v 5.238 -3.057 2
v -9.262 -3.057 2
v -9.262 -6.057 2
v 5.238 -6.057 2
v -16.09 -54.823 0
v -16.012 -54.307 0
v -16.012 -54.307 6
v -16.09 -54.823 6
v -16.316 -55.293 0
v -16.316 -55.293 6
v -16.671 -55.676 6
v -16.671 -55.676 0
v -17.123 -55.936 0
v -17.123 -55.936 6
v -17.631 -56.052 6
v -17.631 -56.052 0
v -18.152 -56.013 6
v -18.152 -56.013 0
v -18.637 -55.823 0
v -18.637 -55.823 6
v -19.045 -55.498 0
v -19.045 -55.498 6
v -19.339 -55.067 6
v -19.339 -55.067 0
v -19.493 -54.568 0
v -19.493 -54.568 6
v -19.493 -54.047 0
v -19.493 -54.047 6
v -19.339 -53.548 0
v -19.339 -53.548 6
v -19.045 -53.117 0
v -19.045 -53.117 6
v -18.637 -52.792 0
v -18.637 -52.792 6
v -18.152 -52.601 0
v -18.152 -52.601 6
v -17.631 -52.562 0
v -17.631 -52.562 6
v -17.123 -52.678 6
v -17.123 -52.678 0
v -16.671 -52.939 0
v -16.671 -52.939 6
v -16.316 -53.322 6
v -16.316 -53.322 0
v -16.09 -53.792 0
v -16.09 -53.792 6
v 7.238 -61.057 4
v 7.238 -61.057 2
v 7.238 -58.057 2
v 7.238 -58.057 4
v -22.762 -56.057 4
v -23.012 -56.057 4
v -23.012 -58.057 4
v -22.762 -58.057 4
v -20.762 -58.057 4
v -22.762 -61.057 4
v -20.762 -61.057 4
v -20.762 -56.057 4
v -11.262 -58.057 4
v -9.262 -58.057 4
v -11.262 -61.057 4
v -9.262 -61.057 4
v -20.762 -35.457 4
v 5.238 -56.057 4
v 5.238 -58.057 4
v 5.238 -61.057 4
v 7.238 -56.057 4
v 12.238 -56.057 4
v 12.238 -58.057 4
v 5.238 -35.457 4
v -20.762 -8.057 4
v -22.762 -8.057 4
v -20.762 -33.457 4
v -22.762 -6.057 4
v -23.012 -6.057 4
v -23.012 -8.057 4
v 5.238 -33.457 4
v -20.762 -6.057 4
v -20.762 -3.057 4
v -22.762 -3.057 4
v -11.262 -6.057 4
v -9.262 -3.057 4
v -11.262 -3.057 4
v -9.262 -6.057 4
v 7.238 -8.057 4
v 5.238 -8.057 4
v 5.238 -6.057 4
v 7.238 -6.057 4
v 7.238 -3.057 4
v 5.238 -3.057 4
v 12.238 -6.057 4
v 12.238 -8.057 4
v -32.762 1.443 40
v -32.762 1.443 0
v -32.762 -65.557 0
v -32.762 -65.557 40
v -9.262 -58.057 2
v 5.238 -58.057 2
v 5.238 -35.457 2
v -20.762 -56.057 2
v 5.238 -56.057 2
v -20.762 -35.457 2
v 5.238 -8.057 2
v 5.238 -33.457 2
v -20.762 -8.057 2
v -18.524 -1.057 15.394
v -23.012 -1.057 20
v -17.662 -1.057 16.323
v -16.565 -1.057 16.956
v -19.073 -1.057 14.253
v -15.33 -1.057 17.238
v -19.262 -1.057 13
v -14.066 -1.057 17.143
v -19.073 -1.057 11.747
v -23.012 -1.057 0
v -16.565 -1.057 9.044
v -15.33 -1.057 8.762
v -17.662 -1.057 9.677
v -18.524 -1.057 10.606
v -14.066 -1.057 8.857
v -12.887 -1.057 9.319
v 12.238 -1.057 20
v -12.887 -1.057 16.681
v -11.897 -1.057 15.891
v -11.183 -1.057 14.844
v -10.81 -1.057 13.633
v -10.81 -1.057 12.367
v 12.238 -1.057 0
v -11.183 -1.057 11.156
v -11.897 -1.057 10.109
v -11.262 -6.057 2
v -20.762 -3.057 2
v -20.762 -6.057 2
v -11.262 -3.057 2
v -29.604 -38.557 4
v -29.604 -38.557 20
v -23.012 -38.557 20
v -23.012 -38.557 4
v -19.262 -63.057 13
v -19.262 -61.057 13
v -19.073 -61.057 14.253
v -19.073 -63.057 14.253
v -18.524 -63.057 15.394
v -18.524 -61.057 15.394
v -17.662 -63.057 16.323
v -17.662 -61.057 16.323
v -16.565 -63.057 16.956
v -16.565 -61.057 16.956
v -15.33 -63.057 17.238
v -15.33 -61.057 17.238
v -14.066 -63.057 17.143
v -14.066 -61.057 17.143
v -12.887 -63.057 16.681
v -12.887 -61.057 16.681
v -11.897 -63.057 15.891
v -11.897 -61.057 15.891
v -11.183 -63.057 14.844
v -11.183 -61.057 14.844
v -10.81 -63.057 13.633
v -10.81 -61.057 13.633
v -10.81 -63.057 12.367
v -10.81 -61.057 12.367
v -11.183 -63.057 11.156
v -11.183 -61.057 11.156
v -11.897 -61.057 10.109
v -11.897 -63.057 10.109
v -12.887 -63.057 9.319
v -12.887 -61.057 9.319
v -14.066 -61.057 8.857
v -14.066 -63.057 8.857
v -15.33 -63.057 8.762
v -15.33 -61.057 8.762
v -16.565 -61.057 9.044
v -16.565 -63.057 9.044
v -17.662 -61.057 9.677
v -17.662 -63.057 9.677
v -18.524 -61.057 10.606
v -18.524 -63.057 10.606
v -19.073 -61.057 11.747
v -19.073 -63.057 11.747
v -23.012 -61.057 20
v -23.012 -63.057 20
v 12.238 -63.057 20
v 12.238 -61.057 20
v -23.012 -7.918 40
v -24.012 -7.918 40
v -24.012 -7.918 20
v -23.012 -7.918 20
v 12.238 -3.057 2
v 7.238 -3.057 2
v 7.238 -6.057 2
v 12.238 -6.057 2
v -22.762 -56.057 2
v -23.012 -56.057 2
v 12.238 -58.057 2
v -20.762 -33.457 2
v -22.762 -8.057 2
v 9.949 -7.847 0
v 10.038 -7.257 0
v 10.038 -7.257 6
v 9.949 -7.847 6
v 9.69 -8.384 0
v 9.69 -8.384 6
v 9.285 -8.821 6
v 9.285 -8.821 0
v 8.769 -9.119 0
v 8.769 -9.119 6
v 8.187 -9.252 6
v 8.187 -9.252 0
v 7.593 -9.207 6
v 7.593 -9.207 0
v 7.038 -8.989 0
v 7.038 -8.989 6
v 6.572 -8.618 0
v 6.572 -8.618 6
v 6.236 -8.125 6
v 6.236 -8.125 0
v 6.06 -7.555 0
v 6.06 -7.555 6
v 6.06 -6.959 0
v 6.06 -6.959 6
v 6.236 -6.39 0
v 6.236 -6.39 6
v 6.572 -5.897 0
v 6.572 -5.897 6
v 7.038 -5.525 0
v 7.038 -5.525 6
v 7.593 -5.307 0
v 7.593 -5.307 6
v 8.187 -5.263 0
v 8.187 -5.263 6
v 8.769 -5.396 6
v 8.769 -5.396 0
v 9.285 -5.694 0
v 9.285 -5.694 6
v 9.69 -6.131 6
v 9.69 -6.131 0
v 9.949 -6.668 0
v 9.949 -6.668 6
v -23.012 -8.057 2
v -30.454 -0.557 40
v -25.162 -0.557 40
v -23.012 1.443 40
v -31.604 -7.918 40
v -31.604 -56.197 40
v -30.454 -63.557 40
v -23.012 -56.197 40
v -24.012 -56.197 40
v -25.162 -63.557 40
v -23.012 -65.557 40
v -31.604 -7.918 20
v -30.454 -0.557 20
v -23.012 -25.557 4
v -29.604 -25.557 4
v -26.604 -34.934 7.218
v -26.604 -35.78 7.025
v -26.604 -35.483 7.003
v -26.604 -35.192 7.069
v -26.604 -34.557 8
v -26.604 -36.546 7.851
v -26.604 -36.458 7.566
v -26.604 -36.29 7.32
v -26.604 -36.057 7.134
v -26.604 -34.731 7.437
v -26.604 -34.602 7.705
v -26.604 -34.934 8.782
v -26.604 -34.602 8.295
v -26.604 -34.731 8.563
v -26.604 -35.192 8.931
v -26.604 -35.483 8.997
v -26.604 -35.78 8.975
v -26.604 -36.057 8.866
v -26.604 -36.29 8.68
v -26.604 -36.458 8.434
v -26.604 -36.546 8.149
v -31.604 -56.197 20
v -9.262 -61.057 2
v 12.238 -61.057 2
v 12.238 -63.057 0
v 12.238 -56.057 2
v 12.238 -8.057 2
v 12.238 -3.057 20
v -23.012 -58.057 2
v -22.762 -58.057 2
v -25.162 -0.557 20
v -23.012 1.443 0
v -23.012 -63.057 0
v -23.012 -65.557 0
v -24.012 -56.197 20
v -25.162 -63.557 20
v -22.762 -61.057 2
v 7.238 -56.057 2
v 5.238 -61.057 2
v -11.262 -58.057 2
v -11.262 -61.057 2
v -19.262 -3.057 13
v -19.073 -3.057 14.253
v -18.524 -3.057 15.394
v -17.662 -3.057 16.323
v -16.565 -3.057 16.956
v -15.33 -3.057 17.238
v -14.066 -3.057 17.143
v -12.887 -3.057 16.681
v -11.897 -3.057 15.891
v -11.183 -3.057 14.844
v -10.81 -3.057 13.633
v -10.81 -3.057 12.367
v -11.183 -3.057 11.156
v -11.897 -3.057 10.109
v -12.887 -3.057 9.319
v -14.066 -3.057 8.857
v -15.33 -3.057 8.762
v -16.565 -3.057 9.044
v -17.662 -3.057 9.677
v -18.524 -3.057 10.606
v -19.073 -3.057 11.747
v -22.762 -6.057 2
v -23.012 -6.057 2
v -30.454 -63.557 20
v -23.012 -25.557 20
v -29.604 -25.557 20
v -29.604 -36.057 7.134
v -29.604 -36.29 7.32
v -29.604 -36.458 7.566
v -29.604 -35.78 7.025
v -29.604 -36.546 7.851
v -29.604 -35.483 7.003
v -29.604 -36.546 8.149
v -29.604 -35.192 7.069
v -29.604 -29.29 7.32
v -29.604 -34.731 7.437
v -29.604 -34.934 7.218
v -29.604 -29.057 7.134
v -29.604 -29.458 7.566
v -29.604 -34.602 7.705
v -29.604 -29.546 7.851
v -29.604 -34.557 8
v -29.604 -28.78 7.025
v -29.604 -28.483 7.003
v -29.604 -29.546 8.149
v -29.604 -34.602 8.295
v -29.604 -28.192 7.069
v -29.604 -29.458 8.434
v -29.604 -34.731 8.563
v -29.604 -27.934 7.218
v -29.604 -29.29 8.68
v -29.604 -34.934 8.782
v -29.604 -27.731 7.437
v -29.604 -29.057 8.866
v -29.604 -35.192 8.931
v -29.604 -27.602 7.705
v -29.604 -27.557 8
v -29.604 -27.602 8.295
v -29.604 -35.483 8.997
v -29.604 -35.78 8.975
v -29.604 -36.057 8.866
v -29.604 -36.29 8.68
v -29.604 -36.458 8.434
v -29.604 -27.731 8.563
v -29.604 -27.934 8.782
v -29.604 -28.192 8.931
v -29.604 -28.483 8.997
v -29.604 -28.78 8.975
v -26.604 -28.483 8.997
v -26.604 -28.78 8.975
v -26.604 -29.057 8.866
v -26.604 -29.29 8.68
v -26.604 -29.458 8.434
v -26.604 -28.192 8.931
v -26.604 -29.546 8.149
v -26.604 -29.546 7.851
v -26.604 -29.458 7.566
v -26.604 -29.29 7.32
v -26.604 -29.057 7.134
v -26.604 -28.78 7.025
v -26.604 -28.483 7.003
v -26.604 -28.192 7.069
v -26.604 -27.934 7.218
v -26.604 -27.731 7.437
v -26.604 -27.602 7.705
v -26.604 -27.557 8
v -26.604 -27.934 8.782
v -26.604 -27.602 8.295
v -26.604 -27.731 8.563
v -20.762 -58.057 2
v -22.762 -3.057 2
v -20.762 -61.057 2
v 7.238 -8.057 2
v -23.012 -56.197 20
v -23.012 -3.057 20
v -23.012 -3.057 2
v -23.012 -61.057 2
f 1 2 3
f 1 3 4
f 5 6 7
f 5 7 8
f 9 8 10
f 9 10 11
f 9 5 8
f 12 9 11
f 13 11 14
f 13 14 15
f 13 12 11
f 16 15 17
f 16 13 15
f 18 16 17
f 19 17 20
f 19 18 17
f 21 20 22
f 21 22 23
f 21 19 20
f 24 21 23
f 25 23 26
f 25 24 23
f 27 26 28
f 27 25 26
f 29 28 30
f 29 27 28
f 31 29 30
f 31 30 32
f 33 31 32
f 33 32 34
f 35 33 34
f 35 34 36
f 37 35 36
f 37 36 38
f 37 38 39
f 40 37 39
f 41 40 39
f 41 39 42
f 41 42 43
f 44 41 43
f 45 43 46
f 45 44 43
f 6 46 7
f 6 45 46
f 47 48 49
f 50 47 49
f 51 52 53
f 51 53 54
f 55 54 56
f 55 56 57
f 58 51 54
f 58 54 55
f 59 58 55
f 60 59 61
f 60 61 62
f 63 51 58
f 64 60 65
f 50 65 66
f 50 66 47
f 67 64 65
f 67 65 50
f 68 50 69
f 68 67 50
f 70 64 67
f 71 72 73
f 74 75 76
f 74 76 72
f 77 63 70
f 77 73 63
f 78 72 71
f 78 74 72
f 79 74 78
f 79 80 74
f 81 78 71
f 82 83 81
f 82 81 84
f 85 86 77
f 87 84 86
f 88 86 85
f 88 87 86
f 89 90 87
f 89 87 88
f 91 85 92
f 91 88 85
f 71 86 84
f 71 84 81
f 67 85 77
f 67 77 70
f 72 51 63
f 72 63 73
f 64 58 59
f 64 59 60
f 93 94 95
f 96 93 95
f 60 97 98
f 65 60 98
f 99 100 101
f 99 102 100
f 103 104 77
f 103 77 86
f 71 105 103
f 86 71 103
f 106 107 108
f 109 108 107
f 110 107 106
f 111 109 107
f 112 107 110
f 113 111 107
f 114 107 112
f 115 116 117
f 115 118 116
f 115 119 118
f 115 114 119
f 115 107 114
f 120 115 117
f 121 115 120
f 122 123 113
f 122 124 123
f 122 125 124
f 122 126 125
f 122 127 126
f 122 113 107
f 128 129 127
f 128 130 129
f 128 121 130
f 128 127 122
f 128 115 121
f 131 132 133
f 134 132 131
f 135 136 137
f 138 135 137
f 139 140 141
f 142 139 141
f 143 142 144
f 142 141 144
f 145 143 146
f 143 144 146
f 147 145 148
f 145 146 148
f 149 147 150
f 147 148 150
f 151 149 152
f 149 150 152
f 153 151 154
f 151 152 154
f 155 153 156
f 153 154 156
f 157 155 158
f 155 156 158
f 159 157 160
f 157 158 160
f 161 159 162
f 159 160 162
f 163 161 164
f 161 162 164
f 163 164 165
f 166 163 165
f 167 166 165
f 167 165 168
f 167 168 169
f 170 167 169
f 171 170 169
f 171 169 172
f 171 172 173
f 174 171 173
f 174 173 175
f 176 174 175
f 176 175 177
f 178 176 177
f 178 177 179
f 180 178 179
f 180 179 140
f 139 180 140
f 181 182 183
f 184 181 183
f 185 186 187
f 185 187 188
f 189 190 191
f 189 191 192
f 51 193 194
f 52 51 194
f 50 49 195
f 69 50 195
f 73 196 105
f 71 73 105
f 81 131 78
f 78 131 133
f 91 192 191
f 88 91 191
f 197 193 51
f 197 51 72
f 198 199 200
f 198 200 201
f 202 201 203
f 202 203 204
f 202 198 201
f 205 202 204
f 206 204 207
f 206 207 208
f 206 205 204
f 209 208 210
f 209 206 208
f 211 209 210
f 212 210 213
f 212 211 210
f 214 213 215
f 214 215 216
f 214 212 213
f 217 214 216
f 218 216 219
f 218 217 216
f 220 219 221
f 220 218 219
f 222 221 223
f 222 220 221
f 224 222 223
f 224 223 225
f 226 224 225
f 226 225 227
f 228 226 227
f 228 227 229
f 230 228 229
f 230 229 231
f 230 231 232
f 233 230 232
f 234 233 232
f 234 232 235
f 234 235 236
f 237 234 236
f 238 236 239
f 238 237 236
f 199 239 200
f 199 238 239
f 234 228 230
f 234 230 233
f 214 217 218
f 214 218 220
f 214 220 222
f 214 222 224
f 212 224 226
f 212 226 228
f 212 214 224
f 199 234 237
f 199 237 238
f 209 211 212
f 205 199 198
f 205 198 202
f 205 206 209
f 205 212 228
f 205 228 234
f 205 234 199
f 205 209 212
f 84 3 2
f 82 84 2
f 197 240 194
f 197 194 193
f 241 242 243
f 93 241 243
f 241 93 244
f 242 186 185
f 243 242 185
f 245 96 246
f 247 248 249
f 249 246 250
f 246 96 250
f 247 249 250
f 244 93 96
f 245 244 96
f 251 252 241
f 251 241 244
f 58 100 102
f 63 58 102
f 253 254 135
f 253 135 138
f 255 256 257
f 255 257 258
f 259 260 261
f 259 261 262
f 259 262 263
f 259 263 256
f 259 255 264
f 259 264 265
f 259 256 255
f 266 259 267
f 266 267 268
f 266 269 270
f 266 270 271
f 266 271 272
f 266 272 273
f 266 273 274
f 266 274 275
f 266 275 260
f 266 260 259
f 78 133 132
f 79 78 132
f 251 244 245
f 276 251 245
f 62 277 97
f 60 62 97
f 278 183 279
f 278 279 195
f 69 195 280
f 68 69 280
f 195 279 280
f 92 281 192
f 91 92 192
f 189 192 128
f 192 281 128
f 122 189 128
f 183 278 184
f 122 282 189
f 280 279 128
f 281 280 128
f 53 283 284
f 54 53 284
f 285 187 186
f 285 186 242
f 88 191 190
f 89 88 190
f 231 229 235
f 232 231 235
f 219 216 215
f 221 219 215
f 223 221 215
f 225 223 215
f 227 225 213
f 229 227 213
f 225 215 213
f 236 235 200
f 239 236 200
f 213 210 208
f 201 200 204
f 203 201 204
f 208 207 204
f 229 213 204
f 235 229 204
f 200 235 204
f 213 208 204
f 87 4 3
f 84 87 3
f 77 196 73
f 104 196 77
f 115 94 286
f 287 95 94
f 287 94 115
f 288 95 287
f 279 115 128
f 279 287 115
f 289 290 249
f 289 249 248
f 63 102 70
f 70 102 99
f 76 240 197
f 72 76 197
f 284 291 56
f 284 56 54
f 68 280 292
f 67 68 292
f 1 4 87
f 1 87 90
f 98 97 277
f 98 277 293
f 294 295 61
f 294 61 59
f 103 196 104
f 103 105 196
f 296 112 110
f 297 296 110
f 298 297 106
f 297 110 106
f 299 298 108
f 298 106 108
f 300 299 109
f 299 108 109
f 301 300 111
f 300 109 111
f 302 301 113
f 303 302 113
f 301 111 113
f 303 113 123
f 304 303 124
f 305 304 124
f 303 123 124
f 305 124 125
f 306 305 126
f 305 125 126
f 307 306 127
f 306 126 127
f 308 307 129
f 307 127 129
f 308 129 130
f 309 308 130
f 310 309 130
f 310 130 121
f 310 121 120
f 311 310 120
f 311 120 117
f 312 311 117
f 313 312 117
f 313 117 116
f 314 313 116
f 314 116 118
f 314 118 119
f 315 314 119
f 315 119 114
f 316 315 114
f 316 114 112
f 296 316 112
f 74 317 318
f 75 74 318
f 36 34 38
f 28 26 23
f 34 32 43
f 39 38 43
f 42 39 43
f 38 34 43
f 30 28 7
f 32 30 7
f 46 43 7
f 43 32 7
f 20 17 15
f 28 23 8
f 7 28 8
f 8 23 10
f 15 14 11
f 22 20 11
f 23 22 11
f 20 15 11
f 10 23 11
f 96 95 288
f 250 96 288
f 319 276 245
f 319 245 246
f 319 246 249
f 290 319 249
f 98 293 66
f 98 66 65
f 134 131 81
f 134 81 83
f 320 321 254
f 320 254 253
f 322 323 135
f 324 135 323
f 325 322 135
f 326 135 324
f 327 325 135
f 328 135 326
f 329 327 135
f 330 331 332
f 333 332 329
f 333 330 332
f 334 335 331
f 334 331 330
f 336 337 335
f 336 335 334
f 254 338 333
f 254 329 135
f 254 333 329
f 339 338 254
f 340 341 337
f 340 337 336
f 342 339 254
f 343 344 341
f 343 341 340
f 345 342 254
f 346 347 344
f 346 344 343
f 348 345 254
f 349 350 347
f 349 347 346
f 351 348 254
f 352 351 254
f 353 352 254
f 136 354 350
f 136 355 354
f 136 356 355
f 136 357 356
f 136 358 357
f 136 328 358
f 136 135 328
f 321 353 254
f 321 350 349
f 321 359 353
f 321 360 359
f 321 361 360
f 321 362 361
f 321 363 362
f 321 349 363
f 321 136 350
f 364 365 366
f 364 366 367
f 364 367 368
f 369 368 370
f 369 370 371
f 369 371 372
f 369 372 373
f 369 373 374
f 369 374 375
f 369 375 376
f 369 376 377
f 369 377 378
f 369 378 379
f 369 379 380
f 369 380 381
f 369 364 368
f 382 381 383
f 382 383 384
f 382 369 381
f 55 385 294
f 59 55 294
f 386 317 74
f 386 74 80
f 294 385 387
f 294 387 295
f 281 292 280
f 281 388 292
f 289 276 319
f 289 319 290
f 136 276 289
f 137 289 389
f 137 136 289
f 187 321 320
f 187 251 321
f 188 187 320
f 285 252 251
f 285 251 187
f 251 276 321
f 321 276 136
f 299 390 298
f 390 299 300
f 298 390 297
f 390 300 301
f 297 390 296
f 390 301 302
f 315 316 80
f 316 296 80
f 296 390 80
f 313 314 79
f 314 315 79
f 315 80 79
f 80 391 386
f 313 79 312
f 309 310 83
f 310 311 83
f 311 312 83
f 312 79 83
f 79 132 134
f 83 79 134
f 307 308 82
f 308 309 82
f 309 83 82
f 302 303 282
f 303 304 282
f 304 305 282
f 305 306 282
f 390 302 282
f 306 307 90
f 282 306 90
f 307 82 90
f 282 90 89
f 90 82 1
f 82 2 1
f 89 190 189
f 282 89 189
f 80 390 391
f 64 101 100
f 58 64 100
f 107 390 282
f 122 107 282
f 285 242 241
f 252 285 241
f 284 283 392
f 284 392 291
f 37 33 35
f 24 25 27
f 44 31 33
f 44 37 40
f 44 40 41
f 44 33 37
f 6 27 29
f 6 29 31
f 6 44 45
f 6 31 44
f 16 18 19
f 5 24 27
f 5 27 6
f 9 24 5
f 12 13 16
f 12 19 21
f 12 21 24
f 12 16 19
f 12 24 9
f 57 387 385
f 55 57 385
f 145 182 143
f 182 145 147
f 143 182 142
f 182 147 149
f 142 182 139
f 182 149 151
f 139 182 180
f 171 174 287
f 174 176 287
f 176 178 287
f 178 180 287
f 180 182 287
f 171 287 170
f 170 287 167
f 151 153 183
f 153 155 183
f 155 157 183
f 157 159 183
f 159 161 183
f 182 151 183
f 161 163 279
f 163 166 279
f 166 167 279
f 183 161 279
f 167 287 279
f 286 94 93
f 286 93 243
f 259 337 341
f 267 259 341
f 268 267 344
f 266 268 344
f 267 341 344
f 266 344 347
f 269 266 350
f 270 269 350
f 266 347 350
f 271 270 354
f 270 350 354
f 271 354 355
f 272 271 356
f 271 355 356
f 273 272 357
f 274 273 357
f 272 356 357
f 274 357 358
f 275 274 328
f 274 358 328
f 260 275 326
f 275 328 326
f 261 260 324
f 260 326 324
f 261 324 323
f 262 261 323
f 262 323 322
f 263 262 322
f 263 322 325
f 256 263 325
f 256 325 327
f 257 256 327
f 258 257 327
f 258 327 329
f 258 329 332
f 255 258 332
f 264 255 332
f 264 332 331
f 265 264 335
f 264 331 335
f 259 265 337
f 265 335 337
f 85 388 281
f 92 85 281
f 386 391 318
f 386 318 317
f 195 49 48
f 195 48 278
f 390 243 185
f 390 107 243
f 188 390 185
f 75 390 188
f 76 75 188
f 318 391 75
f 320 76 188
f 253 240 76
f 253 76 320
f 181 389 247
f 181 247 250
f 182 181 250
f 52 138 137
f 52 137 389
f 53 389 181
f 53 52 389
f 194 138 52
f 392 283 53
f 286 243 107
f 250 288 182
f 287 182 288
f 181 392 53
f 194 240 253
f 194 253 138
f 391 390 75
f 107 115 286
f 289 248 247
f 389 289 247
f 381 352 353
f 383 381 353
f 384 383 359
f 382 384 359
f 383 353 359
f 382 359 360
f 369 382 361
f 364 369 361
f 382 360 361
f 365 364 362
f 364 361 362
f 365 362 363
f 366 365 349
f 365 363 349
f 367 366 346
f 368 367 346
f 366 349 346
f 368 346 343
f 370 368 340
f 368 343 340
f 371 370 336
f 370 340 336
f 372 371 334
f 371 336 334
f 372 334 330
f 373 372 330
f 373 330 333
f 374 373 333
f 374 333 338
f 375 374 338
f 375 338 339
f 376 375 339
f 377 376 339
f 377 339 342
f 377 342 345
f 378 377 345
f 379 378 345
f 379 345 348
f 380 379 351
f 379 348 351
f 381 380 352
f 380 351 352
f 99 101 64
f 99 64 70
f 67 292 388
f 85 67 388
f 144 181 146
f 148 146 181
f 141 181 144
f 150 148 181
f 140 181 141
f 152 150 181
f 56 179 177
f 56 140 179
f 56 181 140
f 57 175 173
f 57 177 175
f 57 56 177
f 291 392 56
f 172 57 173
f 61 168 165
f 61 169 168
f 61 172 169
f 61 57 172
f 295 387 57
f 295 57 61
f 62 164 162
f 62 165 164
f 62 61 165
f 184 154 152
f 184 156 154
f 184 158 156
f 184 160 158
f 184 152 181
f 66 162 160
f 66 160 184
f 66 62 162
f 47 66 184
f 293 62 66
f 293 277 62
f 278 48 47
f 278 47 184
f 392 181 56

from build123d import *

# Parameters (mm, degrees)
F0_W      = 45
F0_H      = 62
F1_DEPTH  = 2
F2_W      = 10
F2_H      = 2
F2_W_2    = 2
F2_H_2    = 5
F2_W_3    = 9.5
F2_H_3    = 48
F2_W_4    = 14.5
F2_W_5    = 5
F3_DEPTH  = 2
F4_R      = 1.75
F5_DEPTH  = 6
F4_R_2    = 2
F6_W      = 26
F6_H      = 2
F7_DEPTH  = 2
F8_W      = 45
F8_H      = 2
F9_DEPTH  = 20
F10_W     = 9.75
F10_H     = 67
F11_DEPTH = 40
F12_W     = 1
F12_H     = 48.2785870243
F13_DEPTH = 20
F14_W     = 6.592
F14_H     = 13
F15_DEPTH = 16
F16_R     = 4.25
F17_DEPTH = 70
F18_R     = 1
F19_DEPTH = 3


with BuildPart() as f1:
    # F0 (on Top) → F1 (new body)
    with BuildSketch(Plane.XY):
        with Locations((-10.2621772885, -32.0573406816)):
            Rectangle(F0_W, F0_H)
    extrude(amount=F1_DEPTH)

    # F2 (on face) → F3 (join)
    with BuildSketch(Plane.XY.offset(2)):
        with Locations((-27.7621772885, -57.0573406816)):
            Rectangle(F2_W, F2_H)
        with Locations((-21.7621772885, -57.0573406816)):
            Rectangle(F2_W_2, F2_H)
        with Locations((-21.7621772885, -60.5573406816)):
            Rectangle(F2_W_2, F2_H_2)
        with Locations((-16.0121772885, -57.0573406816)):
            Rectangle(F2_W_3, F2_H)
        with Locations((-21.7621772885, -32.0573406816)):
            Rectangle(F2_W_2, F2_H_3)
        with Locations((-10.2621772885, -57.0573406816)):
            Rectangle(F2_W_2, F2_H)
        with Locations((-10.2621772885, -60.5573406816)):
            Rectangle(F2_W_2, F2_H_2)
        with Locations((-27.7621772885, -7.0573406816)):
            Rectangle(F2_W, F2_H)
        with Locations((-21.7621772885, -7.0573406816)):
            Rectangle(F2_W_2, F2_H)
        with Locations((-2.0121772885, -57.0573406816)):
            Rectangle(F2_W_4, F2_H)
        with Locations((-16.0121772885, -7.0573406816)):
            Rectangle(F2_W_3, F2_H)
        with Locations((-21.7621772885, -3.5573406816)):
            Rectangle(F2_W_2, F2_H_2)
        with Locations((6.2378227115, -57.0573406816)):
            Rectangle(F2_W_2, F2_H)
        with Locations((6.2378227115, -60.5573406816)):
            Rectangle(F2_W_2, F2_H_2)
        with Locations((-10.2621772885, -7.0573406816)):
            Rectangle(F2_W_2, F2_H)
        with Locations((9.7378227115, -57.0573406816)):
            Rectangle(F2_W_5, F2_H)
        with Locations((6.2378227115, -32.0573406816)):
            Rectangle(F2_W_2, F2_H_3)
        with Locations((-2.0121772885, -7.0573406816)):
            Rectangle(F2_W_4, F2_H)
        with Locations((-10.2621772885, -3.5573406816)):
            Rectangle(F2_W_2, F2_H_2)
        with Locations((6.2378227115, -7.0573406816)):
            Rectangle(F2_W_2, F2_H)
        with Locations((9.7378227115, -7.0573406816)):
            Rectangle(F2_W_5, F2_H)
        with Locations((6.2378227115, -3.5573406816)):
            Rectangle(F2_W_2, F2_H_2)
    extrude(amount=F3_DEPTH)

    # F6 (on face) → F7 (join)
    with BuildSketch(Plane.XY.offset(2)):
        with Locations((-7.7621772885, -34.4568399489)):
            Rectangle(F6_W, F6_H)
    extrude(amount=F7_DEPTH)

    # F8 (on face) → F9 (join)
    with BuildSketch(Plane(origin=(0, 0, 0), x_dir=(1, 0, 0), z_dir=(0, 0, -1))):
        with Locations((-10.2621772885, 62.0573406816)):
            Rectangle(F8_W, F8_H)
        with Locations((-10.2621772885, 2.0573406816)):
            Rectangle(F8_W, F8_H)
    extrude(amount=-F9_DEPTH)

    # F10 (on face) → F11 (join)
    with BuildSketch(Plane(origin=(0, 0, 0), x_dir=(1, 0, 0), z_dir=(0, 0, -1))):
        with Locations((-27.8871772885, 32.0573406816)):
            Rectangle(F10_W, F10_H)
    extrude(amount=-F11_DEPTH)

    # F12 (on face) → F13 (cut)
    with BuildSketch(Plane.XY.offset(40)):
        Polygon((-31.6041772885, -7.9180471694), (-31.6041772885, -56.1966341937), (-30.4541772885, -63.5573406816), (-25.1621772885, -63.5573406816), (-24.0121772885, -56.1966341937), (-24.0121772885, -7.9180471694), (-25.1621772885, -0.5573406816), (-30.4541772885, -0.5573406816), align=None)
        with Locations((-23.5121772885, -32.0573406816)):
            Rectangle(F12_W, F12_H)
    extrude(amount=-F13_DEPTH, mode=Mode.SUBTRACT)

    # F14 (on face) → F15 (cut)
    with BuildSketch(Plane.XY.offset(20)):
        with Locations((-26.3081772885, -32.0573406816)):
            Rectangle(F14_W, F14_H)
    extrude(amount=-F15_DEPTH, mode=Mode.SUBTRACT)

    # F16 (on face) → F17 (cut)
    with BuildSketch(Plane(origin=(0, -1.0573406816, 0), x_dir=(-1, 0, 0), z_dir=(0, 1, 0))):
        with Locations((15.0121772885, 13)):
            Circle(F16_R)
    extrude(amount=-F17_DEPTH, mode=Mode.SUBTRACT)

    # F18 (on face) → F19 (join)
    with BuildSketch(Plane.YZ.offset(-29.6041772885)):
        with Locations((-35.5573406816, 8)):
            Circle(F18_R)
        with Locations((-28.5573406816, 8)):
            Circle(F18_R)
    extrude(amount=F19_DEPTH)


with BuildPart() as f5:
    # F4 (on face) → F5 (new body)
    with BuildSketch(Plane(origin=(0, 0, 0), x_dir=(1, 0, 0), z_dir=(0, 0, -1))):
        with Locations((-17.7621772885, 54.3073406816)):
            Circle(F4_R)
    extrude(amount=-F5_DEPTH)


with BuildPart() as f5b:
    # F4 (on face) → F5, piece 2 (new body)
    with BuildSketch(Plane(origin=(0, 0, 0), x_dir=(1, 0, 0), z_dir=(0, 0, -1))):
        with Locations((8.0378227115, 7.2573406816)):
            Circle(F4_R_2)
    extrude(amount=-F5_DEPTH)


solid = Compound([f1.part, f5.part, f5b.part])
